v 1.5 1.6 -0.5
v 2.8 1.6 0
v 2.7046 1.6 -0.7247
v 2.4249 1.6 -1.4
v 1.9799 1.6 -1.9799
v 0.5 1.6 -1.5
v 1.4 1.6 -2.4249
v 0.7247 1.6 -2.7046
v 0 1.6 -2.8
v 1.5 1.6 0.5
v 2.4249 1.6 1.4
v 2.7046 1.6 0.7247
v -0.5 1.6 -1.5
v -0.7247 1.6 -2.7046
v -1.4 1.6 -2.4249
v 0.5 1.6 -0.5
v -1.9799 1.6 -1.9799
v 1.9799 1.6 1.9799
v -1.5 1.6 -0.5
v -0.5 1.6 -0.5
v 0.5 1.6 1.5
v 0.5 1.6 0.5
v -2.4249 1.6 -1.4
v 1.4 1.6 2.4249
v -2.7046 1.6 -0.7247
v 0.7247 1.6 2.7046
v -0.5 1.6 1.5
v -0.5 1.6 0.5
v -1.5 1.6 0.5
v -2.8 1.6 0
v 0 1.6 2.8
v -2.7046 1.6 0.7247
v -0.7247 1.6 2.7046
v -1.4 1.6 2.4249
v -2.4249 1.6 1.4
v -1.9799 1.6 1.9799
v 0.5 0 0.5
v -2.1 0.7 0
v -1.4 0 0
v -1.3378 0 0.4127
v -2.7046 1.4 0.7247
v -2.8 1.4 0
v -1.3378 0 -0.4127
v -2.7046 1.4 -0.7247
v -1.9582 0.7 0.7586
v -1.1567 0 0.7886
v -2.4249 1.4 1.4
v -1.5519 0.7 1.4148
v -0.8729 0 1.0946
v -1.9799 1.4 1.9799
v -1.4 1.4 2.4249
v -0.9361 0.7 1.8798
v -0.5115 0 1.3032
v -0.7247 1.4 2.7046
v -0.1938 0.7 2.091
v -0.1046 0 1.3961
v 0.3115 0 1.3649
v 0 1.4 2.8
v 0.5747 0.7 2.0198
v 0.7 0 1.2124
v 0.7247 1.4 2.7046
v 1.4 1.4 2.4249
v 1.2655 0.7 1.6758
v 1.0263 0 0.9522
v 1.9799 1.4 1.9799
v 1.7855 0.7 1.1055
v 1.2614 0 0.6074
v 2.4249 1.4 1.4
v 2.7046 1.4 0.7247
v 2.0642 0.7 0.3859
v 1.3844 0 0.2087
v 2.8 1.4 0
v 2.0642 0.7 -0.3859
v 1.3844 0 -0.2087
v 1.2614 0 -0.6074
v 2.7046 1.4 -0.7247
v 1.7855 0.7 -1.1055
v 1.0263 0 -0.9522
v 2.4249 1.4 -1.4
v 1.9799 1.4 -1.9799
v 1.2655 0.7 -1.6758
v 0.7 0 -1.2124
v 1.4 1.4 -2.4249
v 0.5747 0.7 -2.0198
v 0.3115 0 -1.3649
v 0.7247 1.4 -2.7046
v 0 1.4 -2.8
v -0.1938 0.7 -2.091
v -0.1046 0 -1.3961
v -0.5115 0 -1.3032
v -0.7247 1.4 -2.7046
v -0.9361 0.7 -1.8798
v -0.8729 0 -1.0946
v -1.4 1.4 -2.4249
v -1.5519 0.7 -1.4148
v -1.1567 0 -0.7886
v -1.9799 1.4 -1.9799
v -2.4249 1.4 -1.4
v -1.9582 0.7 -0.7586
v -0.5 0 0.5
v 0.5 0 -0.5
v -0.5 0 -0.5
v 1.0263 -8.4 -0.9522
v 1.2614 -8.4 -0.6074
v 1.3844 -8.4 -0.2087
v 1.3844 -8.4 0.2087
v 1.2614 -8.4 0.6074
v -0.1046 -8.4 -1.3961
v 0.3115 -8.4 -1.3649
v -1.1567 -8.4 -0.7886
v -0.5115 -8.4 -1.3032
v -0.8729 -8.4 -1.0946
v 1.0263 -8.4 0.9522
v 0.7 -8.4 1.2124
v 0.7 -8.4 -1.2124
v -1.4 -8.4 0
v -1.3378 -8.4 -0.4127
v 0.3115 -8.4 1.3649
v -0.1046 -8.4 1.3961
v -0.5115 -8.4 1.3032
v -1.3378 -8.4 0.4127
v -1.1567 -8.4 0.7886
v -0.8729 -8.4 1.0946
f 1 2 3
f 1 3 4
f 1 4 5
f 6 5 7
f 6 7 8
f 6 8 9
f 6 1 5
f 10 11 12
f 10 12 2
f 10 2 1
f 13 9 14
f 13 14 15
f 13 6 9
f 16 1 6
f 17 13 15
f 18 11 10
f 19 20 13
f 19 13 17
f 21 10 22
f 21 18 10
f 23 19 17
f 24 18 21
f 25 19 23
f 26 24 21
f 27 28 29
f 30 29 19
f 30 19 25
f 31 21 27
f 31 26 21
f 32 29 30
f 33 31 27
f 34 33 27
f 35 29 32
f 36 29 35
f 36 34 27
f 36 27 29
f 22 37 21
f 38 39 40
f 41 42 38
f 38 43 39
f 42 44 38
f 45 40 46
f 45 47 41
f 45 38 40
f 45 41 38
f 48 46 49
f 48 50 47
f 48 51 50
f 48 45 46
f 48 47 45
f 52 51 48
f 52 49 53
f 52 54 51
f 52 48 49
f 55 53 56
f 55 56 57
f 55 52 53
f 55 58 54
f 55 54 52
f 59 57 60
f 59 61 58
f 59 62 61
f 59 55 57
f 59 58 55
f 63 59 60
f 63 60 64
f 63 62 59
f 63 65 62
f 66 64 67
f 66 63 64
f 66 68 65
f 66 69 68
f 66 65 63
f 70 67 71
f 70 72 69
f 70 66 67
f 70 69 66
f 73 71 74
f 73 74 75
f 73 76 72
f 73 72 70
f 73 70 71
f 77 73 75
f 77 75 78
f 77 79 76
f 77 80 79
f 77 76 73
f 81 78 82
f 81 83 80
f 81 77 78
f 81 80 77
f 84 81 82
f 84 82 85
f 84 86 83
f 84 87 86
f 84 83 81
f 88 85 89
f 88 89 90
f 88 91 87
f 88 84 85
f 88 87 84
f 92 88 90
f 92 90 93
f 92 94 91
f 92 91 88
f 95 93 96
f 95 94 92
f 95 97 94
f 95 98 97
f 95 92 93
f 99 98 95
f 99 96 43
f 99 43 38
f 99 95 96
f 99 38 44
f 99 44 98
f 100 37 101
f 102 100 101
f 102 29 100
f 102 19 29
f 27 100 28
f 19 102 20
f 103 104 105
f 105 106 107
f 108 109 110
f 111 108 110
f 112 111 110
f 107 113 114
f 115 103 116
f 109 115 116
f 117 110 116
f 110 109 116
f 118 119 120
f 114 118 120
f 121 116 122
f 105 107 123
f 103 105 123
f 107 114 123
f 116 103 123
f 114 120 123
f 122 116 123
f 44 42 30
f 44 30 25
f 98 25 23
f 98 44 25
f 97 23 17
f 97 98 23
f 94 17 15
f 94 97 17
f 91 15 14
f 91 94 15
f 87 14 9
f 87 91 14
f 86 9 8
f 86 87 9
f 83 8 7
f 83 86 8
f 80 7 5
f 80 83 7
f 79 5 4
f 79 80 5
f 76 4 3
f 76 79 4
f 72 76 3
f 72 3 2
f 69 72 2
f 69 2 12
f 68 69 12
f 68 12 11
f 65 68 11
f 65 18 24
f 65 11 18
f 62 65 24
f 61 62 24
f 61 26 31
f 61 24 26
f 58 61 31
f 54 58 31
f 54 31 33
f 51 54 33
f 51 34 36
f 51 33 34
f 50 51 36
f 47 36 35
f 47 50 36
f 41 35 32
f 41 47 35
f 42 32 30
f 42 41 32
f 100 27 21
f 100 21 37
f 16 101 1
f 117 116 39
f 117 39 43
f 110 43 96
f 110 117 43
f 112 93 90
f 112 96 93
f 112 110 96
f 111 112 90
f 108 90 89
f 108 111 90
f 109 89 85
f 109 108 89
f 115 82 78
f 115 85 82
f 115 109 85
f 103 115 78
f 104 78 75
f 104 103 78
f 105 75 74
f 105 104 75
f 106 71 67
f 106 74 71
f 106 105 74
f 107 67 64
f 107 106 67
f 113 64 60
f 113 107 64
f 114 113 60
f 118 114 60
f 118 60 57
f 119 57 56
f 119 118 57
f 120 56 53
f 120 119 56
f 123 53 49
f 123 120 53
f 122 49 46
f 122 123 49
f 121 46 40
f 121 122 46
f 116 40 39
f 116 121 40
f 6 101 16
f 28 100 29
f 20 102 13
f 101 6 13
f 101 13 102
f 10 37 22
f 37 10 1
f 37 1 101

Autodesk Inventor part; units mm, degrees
ref_plane "YZ Plane" through (0, 0, 0) normal (1, 0, 0) x (0, 1, 0)
ref_plane "XZ Plane" through (0, 0, 0) normal (0, 1, 0) x (-1, 0, 0)
ref_plane "XY Plane" through (0, 0, 0) normal (0, 0, 1) x (1, 0, 0)
sketch "Эскиз1" plane through (0, 0, 0) normal (0, 0, 1) x (1, 0, 0)
  line L0 (-1.4, 0) -> (-1.4, -8.4)
  line L1 (-1.4, -8.4) -> (0, -8.4)
  line L2 (0, -8.4) -> (0, 1.6)
  line L3 (0, 1.6) -> (-2.8, 1.6)
  line L4 (-2.8, 1.6) -> (-2.8, 1.4)
  line L5 (-2.8, 1.4) -> (-1.4, 0)
  point P0 (0, 0)
  dimension "d0" = 2.8
  dimension "d2" = 45
  dimension "d3" = 1.6
  dimension "d4" = 10
  dimension "d5" = 5.6
revolve "Вращение1" add sketch "Эскиз1" angle 360 about axis through (0, -8.4, 0) along (0, 1, 0)
sketch "Эскиз2" plane through (0, 0, 0) normal (1, 0, 0) x (0, 1, 0)
  line L0 (1.6, -2.8) -> (1.6, 2.8) projected
  line L1 (1.6, 1.5) -> (1.6, 0)
  line L2 (0, 0) -> (1.6, 0)
  line L3 (1.6, 1.5) -> (0, 0.5)
  line L4 (0, -1.4) -> (0, 1.4) projected
  line L5 (0, 0) -> (0, 0.5)
  dimension "d7" = 1.5
  dimension "d13" = 0.5
extrude "Выдавливание1" cut sketch "Эскиз2" along normal mid plane 1
pattern_circular "Круговой массив1" count 4 over 360 about axis through (0, -10, 0) along (0, 1, 0) of "Выдавливание1"
thread "Резьба1" size "M3x0.5" class "6g" standard "ANSI Metric M Profile" full length
properties part number "M3x10P"
